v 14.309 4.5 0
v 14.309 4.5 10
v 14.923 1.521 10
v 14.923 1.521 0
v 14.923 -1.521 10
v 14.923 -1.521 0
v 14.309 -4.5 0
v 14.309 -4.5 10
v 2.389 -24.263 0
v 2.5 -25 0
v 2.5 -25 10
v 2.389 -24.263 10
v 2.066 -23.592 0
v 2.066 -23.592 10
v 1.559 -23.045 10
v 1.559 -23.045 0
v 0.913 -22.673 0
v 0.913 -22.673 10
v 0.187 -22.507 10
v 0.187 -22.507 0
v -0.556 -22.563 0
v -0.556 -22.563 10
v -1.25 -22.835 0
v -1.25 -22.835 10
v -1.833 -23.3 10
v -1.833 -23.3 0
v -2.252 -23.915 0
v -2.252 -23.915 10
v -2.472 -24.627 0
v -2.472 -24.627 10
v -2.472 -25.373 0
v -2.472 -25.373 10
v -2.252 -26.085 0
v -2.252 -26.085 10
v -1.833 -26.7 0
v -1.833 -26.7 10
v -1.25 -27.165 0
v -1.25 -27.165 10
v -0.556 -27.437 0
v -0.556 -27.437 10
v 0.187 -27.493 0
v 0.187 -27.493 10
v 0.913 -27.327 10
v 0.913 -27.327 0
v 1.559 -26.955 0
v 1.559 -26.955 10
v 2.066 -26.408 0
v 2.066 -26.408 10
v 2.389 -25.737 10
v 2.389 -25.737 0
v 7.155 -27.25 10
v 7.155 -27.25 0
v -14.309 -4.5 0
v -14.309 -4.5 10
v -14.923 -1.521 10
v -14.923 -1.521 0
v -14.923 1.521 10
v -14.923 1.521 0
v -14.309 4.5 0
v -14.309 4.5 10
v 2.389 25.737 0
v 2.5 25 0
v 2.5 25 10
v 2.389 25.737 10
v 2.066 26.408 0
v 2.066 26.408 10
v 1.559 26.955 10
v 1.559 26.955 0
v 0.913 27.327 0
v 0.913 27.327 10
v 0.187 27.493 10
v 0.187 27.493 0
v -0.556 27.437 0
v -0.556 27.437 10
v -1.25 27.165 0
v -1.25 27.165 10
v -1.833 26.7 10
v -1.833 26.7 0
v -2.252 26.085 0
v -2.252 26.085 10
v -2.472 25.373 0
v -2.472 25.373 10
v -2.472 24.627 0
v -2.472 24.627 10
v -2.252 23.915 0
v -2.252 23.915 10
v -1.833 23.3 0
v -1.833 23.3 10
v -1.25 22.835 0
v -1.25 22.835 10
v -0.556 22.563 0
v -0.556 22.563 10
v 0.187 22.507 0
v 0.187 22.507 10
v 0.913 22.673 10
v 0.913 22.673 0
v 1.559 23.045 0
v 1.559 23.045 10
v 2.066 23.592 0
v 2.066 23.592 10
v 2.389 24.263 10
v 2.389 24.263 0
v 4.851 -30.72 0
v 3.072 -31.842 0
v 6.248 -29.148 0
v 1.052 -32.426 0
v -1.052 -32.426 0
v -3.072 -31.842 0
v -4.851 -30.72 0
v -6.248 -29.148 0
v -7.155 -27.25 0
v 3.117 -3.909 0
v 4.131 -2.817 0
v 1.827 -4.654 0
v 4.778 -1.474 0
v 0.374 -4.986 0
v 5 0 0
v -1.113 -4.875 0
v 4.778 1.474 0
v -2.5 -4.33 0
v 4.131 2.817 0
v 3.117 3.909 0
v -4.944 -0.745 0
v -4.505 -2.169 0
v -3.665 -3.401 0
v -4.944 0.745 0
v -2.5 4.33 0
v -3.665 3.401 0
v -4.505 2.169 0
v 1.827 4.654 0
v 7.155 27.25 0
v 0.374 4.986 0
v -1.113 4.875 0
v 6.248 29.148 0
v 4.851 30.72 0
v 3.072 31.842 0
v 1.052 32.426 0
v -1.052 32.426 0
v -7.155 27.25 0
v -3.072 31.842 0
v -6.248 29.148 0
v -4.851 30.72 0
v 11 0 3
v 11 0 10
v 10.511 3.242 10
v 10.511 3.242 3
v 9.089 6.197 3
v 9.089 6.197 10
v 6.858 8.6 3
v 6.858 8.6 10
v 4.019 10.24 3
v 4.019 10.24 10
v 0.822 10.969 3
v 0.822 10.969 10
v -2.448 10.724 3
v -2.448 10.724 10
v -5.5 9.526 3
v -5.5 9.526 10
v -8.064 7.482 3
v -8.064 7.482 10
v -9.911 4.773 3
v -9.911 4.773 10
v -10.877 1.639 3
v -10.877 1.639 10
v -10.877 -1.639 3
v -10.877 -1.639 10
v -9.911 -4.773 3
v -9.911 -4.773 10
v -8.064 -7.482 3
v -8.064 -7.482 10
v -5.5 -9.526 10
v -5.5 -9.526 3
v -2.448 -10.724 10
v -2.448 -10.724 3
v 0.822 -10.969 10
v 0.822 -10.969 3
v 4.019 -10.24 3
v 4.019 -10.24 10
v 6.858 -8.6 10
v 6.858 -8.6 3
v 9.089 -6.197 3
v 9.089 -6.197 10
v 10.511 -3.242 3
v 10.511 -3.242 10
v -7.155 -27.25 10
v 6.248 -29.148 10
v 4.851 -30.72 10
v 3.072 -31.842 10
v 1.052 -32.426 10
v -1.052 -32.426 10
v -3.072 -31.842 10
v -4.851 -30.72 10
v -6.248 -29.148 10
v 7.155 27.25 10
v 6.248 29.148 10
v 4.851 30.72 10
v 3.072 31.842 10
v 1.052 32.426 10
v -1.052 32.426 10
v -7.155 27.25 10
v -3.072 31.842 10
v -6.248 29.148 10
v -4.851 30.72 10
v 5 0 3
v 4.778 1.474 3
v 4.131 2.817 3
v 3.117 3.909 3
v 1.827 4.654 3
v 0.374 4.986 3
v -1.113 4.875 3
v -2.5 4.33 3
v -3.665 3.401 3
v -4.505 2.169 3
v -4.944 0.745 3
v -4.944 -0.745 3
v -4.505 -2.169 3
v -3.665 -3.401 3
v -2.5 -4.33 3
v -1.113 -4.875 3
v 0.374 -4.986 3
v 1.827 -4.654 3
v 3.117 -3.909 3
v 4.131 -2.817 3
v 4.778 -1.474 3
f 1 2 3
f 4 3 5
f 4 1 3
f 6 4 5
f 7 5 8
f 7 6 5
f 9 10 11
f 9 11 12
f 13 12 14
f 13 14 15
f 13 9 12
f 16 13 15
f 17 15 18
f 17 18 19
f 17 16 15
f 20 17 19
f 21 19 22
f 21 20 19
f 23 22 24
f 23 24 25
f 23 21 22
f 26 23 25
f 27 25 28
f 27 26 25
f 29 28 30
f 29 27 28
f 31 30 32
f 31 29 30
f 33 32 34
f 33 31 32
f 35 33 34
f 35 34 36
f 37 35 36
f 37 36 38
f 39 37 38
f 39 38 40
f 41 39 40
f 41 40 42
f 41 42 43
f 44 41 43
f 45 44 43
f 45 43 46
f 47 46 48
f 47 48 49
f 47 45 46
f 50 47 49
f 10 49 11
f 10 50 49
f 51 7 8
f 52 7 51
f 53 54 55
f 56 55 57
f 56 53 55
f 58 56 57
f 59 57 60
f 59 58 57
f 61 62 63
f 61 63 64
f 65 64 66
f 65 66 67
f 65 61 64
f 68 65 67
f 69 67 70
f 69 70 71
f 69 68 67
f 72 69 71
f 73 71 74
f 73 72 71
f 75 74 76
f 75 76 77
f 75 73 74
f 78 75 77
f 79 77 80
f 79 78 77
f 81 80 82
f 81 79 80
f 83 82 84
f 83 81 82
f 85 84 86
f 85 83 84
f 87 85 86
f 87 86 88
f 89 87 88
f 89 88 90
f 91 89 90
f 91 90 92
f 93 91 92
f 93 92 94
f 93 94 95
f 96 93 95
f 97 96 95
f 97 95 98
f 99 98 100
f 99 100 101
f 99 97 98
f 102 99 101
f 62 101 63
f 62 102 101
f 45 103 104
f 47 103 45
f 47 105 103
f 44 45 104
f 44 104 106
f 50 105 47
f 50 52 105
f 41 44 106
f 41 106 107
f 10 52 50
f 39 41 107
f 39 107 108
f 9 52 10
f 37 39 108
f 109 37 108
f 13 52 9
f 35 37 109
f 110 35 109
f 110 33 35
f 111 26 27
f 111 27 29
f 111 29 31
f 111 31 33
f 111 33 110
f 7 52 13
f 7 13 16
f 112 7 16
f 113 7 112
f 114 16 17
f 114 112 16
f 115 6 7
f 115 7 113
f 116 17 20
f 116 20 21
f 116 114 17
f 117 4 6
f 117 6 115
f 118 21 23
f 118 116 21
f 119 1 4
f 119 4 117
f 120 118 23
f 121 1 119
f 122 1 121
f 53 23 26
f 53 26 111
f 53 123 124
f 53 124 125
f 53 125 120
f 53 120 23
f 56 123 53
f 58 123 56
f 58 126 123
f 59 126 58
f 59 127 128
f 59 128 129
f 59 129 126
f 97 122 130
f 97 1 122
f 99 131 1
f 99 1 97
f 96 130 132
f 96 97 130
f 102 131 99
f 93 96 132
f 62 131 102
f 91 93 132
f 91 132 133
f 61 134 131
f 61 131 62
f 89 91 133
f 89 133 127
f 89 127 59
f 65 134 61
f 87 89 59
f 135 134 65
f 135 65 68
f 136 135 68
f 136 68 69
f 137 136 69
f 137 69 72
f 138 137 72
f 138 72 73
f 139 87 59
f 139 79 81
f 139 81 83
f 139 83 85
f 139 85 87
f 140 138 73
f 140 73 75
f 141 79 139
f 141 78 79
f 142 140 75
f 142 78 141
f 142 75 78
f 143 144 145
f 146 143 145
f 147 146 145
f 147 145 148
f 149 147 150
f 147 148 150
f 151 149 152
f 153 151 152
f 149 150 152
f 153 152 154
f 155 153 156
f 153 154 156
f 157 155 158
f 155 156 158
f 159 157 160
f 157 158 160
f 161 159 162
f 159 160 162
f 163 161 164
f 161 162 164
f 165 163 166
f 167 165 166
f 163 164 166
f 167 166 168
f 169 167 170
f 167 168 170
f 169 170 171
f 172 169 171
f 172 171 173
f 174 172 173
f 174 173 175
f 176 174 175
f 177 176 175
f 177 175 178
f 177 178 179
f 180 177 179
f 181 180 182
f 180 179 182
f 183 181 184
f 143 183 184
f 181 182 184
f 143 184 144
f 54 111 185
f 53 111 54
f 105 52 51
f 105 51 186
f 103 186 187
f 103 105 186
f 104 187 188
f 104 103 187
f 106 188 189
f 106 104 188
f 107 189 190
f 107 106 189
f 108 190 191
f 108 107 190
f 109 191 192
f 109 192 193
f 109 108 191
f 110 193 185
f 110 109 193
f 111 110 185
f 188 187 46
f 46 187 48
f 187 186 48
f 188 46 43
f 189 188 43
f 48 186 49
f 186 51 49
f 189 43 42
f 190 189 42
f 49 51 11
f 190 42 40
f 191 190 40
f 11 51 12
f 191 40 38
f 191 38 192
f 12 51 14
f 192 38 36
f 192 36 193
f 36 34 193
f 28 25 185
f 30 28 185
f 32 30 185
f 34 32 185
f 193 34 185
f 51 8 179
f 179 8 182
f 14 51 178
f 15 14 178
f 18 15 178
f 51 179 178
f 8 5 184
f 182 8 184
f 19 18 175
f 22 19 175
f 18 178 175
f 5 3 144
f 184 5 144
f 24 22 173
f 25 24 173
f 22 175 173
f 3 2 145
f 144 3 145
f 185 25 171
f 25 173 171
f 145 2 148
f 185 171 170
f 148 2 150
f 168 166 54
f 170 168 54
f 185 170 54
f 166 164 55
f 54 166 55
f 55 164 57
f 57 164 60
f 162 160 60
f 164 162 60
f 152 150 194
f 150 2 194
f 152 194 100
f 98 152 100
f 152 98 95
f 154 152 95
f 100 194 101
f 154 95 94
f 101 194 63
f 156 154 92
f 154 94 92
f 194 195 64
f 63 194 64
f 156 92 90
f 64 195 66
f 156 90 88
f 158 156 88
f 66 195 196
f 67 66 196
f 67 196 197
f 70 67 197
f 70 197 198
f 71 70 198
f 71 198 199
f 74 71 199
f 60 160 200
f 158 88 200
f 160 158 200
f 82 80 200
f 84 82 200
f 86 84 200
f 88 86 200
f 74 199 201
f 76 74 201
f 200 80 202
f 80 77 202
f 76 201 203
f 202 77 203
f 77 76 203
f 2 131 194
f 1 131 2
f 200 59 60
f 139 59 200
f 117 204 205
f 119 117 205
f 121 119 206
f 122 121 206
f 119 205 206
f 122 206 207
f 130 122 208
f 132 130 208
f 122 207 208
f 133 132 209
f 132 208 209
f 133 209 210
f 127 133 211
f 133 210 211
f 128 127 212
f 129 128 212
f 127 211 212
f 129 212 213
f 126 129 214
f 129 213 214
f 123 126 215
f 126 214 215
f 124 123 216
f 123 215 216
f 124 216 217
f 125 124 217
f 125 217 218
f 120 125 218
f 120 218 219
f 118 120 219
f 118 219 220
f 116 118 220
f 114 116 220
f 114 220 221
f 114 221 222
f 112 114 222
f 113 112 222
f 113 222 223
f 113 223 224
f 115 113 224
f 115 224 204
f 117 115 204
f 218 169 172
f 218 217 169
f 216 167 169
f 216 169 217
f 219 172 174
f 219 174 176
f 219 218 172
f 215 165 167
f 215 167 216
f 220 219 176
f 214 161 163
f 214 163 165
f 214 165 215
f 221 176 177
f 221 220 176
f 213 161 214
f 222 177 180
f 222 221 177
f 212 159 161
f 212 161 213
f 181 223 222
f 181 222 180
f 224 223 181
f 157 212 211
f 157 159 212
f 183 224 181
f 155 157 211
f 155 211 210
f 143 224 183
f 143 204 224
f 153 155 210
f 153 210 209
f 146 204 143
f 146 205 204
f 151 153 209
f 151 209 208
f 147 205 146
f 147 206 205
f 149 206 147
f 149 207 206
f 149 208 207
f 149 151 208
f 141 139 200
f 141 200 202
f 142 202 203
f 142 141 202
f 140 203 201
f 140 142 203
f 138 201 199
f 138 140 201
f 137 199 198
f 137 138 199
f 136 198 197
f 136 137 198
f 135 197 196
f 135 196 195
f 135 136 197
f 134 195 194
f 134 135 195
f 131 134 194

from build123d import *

# Parameters (mm, degrees)
SKETCH_1_R          = 2.5
EXTRUDE_1_DEPTH     = 10
SKETCH_2_R          = 11
CUT_EXTRUDE_1_DEPTH = 7
CUT_EXTRUDE_2_REACH = 5
SKETCH_3_R          = 5


with BuildPart() as part:
    # Эскиз1 → Бобышка-Вытянуть1 (new body)
    with BuildSketch(Plane.XY):
        with BuildLine():
            Line((-14.309088021, 4.5), (-7.154544011, 27.25))
            ThreePointArc((-7.154544011, 27.25), (0, 32.5), (7.154544011, 27.25))
            Line((7.154544011, 27.25), (14.309088021, 4.5))
            ThreePointArc((14.309088021, 4.5), (15, 0), (14.309088021, -4.5))
            Line((14.309088021, -4.5), (7.154544011, -27.25))
            ThreePointArc((7.154544011, -27.25), (0, -32.5), (-7.154544011, -27.25))
            Line((-7.154544011, -27.25), (-14.309088021, -4.5))
            ThreePointArc((-14.309088021, -4.5), (-15, 0), (-14.309088021, 4.5))
        make_face()
        with Locations((0, 25)):
            Circle(SKETCH_1_R, mode=Mode.SUBTRACT)
        with Locations((0, -25)):
            Circle(SKETCH_1_R, mode=Mode.SUBTRACT)
    extrude(amount=EXTRUDE_1_DEPTH)

    # Эскиз2 → Вырез-Вытянуть1 (cut)
    with BuildSketch(Plane.XY.offset(10)):
        Circle(SKETCH_2_R)
    extrude(amount=-CUT_EXTRUDE_1_DEPTH, mode=Mode.SUBTRACT)

    # Эскиз3 → Вырез-Вытянуть2 (cut, up to next)
    with BuildSketch(Plane.XY.offset(3), mode=Mode.PRIVATE) as cut_extrude_2_sk1:
        Circle(SKETCH_3_R)
    cut_extrude_2_tool1 = extrude(cut_extrude_2_sk1.sketch, amount=-CUT_EXTRUDE_2_REACH, mode=Mode.PRIVATE) & part.part
    add(cut_extrude_2_tool1.solids().sort_by_distance((0, 0, 3))[0], mode=Mode.SUBTRACT)


solid = part.part
